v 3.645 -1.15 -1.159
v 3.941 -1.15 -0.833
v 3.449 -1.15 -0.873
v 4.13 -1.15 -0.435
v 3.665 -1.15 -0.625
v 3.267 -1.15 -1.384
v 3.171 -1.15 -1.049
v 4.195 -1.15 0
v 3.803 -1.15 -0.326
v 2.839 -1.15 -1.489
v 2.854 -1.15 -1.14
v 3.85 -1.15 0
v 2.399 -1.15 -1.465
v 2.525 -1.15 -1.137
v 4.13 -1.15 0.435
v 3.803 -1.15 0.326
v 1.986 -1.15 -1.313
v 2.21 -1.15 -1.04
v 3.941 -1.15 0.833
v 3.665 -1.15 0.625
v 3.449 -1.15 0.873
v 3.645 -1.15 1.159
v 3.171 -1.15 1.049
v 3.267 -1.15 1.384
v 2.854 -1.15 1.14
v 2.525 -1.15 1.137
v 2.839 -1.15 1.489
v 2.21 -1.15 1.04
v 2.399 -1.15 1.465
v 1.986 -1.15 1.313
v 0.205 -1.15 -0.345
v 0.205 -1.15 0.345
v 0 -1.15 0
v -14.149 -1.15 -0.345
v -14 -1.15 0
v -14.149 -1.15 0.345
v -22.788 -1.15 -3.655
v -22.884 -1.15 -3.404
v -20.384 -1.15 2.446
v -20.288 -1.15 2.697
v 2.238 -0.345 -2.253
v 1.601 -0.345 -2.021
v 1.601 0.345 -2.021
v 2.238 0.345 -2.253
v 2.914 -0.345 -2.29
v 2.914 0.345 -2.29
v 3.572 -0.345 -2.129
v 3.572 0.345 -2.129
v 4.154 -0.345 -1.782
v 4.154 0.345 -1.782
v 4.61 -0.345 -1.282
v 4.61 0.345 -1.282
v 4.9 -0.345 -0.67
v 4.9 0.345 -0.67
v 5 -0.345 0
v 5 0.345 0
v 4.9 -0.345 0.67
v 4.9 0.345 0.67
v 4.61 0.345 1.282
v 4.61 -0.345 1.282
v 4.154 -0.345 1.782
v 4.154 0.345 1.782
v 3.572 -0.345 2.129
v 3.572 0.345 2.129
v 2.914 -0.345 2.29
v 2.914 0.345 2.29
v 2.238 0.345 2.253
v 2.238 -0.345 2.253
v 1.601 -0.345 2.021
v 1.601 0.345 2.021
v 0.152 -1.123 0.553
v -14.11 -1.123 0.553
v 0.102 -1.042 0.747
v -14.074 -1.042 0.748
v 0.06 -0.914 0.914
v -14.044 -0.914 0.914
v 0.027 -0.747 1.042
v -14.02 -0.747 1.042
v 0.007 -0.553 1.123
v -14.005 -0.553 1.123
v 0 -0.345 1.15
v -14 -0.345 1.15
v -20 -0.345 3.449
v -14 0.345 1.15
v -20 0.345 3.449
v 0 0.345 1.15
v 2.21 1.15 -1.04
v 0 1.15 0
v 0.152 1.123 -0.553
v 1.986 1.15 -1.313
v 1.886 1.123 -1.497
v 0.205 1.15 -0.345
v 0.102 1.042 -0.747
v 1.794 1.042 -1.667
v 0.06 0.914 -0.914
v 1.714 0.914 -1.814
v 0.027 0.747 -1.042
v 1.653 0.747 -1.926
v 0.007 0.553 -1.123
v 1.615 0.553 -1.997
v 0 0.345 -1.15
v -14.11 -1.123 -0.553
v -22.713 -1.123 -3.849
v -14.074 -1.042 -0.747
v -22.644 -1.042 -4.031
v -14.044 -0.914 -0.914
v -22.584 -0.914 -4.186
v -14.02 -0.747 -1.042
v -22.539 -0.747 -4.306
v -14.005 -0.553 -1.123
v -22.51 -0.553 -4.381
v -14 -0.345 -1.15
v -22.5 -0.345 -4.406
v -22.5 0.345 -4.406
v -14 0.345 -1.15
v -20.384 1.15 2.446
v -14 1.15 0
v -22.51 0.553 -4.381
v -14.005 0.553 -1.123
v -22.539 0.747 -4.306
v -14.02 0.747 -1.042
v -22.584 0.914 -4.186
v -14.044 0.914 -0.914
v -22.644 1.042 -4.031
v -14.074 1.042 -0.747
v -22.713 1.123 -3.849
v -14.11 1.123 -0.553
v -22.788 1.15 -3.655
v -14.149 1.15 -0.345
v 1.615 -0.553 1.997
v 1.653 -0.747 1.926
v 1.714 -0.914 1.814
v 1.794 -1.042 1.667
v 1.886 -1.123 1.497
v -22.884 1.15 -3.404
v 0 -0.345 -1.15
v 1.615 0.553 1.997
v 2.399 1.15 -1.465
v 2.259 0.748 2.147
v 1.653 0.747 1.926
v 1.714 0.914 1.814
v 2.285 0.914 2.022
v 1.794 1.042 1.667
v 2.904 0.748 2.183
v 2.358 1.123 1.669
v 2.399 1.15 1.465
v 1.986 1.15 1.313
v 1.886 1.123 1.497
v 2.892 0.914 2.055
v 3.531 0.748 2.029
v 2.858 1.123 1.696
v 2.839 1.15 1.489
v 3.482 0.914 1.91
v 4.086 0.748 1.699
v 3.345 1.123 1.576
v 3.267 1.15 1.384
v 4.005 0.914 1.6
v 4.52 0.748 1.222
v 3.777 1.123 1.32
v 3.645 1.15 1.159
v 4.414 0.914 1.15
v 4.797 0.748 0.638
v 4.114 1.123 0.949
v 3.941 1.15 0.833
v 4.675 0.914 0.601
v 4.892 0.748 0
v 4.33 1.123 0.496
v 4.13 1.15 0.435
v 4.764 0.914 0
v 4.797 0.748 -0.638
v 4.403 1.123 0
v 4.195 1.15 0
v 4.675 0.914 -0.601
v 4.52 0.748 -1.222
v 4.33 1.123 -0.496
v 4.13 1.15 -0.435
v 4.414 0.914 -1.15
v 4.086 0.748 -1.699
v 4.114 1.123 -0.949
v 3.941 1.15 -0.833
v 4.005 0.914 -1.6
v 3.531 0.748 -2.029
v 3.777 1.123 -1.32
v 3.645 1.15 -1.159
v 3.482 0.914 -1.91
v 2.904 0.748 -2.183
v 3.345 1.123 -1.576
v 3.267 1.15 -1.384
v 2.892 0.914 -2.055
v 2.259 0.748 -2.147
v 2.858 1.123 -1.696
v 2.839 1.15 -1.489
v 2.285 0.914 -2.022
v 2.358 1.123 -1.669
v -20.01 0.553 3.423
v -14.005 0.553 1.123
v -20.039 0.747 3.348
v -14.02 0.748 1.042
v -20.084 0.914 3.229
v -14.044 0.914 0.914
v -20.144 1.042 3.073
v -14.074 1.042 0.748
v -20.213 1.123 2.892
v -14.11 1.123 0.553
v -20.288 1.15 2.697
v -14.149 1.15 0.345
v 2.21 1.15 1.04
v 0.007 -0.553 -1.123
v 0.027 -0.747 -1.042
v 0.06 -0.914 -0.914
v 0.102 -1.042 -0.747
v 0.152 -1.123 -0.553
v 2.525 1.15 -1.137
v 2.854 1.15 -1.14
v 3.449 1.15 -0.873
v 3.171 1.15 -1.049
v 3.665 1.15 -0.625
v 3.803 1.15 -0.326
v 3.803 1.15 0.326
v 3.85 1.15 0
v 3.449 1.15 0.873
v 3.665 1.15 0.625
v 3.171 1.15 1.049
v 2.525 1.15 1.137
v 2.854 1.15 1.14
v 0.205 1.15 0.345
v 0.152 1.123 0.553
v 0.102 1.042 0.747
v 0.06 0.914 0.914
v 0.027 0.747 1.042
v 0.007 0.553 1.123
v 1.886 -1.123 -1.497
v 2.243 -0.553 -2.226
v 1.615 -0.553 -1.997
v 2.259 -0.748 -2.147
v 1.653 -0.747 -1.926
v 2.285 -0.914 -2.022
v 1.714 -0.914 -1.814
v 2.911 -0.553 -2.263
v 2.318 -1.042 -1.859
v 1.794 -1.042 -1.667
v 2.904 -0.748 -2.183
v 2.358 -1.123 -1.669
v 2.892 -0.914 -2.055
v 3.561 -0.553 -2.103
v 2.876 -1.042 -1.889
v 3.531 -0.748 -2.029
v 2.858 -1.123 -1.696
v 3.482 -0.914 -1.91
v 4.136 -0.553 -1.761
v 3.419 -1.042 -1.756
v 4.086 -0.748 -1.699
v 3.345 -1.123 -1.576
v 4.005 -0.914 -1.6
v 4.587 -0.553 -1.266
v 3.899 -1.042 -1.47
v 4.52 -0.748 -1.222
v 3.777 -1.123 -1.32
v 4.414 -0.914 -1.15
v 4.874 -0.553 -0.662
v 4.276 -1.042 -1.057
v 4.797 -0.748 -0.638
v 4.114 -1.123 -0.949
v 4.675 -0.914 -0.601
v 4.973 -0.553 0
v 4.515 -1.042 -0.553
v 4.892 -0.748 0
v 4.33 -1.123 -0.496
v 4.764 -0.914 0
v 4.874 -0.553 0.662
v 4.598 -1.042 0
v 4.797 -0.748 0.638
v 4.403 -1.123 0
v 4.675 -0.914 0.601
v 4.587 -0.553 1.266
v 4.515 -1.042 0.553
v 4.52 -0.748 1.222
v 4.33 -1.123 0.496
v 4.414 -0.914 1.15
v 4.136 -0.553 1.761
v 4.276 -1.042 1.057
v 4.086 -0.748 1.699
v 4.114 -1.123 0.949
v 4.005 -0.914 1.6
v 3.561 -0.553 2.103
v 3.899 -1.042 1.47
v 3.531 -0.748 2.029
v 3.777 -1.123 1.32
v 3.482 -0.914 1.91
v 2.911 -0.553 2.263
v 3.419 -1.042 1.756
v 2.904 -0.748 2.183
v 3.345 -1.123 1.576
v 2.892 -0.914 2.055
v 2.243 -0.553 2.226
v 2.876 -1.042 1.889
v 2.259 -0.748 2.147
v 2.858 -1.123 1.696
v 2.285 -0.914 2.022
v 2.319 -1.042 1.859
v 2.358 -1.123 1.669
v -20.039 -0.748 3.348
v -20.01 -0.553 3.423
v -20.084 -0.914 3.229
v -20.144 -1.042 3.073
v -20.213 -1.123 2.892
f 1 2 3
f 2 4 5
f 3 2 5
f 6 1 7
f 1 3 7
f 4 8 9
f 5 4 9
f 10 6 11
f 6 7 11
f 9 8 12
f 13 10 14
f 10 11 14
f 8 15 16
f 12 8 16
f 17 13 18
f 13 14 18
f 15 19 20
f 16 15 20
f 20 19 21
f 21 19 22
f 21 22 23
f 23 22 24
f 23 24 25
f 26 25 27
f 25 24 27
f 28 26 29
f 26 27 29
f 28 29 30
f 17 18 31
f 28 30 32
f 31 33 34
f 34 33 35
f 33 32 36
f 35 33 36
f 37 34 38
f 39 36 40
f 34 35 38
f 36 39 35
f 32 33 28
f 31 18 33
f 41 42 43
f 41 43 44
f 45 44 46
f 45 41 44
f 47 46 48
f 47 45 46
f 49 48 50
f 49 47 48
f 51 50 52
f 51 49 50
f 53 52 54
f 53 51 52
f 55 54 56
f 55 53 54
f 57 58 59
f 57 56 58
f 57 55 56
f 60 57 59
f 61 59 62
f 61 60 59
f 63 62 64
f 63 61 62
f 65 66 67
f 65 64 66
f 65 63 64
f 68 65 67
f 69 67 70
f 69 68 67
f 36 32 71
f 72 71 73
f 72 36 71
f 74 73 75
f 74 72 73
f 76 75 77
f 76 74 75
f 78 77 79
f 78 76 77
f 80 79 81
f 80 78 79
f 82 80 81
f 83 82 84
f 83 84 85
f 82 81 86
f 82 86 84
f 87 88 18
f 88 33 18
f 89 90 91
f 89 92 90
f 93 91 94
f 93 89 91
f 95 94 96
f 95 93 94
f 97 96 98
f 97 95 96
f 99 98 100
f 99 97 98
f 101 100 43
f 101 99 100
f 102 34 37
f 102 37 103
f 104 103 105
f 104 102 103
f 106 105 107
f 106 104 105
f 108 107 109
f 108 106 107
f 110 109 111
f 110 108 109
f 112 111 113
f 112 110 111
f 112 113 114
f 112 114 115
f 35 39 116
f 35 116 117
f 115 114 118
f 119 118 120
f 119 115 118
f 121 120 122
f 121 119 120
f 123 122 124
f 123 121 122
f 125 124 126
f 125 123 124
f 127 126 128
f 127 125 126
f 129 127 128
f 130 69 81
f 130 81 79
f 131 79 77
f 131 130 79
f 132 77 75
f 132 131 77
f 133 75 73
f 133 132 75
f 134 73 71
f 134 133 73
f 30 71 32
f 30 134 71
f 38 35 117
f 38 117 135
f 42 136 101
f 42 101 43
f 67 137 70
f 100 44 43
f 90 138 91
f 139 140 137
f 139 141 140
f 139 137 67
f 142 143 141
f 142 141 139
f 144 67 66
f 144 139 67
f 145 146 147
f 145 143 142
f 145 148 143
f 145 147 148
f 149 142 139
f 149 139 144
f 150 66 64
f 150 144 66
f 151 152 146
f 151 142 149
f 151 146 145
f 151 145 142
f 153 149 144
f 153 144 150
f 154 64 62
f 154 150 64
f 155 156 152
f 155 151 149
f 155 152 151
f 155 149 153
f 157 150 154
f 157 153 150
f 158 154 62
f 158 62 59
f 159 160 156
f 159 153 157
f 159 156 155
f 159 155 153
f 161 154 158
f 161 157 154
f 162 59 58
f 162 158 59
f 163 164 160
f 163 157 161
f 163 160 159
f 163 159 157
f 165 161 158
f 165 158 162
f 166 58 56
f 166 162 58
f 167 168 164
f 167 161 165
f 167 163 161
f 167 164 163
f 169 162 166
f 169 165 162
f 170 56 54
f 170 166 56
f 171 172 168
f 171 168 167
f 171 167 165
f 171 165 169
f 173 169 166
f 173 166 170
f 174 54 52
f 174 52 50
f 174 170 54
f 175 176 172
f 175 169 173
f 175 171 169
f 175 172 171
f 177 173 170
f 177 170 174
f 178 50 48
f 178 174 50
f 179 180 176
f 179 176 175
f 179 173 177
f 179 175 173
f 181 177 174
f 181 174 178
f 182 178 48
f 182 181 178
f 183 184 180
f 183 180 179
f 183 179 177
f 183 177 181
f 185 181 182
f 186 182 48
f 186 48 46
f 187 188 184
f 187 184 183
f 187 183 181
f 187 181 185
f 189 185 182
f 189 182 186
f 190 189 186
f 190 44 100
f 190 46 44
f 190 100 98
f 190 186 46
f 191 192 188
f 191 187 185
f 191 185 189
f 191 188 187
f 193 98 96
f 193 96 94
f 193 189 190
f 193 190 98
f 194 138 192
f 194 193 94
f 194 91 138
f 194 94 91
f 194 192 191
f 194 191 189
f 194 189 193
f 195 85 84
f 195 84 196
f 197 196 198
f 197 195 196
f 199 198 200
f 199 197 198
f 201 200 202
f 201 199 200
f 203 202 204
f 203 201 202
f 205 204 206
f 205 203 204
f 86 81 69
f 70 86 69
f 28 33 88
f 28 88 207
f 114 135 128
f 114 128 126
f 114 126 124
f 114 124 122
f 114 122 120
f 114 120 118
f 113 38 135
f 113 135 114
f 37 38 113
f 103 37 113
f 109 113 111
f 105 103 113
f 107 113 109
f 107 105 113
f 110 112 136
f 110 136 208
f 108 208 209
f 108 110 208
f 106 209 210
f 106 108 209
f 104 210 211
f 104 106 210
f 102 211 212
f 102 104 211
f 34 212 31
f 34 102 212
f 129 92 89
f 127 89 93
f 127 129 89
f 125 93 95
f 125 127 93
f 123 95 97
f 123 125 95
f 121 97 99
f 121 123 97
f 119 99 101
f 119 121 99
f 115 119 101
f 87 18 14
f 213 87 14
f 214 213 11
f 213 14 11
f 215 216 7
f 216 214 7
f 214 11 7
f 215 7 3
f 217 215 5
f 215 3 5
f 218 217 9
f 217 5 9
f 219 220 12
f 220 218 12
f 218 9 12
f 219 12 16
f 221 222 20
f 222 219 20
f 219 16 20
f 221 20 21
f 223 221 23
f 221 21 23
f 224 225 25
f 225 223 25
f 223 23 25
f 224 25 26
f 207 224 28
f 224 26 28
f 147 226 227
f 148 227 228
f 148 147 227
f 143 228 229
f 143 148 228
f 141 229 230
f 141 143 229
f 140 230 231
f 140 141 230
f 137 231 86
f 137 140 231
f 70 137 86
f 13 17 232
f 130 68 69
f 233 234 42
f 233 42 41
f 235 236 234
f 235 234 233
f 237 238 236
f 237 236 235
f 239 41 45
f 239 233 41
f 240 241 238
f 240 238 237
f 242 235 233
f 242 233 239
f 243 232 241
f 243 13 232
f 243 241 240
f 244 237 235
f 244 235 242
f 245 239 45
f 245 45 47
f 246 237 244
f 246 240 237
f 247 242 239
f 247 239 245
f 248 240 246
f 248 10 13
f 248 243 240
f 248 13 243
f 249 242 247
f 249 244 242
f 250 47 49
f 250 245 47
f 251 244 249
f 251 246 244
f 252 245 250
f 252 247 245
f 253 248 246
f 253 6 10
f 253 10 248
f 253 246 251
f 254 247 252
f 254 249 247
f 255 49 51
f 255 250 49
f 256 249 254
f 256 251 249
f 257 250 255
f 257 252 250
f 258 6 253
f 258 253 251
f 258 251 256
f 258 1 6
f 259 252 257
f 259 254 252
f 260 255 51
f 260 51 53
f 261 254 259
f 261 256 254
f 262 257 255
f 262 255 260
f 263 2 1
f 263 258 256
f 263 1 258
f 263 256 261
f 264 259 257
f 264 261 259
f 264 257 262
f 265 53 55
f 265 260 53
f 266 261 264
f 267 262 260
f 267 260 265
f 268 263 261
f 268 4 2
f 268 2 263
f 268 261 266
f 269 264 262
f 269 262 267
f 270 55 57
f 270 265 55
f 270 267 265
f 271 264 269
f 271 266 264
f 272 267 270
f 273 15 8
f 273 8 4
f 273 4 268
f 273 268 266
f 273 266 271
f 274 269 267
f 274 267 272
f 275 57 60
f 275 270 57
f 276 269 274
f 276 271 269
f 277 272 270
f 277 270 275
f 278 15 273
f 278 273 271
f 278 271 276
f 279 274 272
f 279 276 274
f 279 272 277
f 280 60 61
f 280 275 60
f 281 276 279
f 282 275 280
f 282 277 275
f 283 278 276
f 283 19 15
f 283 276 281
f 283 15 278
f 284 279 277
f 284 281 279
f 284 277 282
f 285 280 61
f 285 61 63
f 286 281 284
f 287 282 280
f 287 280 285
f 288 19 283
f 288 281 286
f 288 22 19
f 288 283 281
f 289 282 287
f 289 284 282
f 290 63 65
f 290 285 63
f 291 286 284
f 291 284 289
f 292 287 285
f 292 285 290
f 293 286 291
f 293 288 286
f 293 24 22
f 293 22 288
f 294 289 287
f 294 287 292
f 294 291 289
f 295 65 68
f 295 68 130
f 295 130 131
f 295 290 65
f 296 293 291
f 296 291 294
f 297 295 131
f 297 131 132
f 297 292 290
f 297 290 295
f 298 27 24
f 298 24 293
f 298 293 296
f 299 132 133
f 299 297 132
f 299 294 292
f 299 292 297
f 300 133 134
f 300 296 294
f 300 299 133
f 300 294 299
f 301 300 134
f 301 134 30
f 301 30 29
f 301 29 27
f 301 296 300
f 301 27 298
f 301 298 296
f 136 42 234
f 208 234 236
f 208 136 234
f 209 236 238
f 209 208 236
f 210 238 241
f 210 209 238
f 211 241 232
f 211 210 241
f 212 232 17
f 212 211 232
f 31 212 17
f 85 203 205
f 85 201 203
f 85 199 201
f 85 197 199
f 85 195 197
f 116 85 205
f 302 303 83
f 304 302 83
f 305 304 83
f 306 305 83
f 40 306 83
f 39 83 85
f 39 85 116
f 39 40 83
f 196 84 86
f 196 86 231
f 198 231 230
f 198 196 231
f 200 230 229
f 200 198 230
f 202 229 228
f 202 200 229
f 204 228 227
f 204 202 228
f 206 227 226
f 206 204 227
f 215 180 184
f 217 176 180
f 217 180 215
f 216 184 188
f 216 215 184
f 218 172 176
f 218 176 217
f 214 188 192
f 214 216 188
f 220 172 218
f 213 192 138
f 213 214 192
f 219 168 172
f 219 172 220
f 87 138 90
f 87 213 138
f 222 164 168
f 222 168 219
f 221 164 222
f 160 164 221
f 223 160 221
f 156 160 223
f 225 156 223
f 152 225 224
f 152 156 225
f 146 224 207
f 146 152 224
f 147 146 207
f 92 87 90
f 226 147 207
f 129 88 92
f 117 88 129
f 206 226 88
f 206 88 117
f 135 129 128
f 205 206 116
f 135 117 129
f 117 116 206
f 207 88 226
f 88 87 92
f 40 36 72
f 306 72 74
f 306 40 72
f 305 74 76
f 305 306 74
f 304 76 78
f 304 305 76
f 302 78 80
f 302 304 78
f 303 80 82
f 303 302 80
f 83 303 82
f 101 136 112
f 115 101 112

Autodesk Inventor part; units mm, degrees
ref_plane "YZ Plane" through (0, 0, 0) normal (1, 0, 0) x (0, 1, 0)
sketch "Sketch1" plane through (0, 0, 0) normal (0, 1, 0) x (-1, 0, 0)
  arc A0 (-1.6014, 2.0207) -> (-1.6014, -2.0207) centre (-2.7, 0) ccw
  arc A1 (-2.2102, 1.0405) -> (-2.2102, -1.0405) centre (-2.7, 0) ccw
  line L0 (0, 1.15) -> (14, 1.15)
  line L1 (0, -1.15) -> (14, -1.15)
  line L2 (14, 1.15) -> (20, 3.4487)
  line L3 (20, 3.4487) -> (20.3842, 2.4459)
  line L4 (20.3842, 2.4459) -> (14, 0)
  line L5 (14, 0) -> (22.8842, -3.4037)
  line L6 (22.8842, -3.4037) -> (22.5, -4.4065)
  line L7 (22.5, -4.4065) -> (14, -1.15)
  line L8 (0, 0) -> (-2.2102, -1.0405)
  line L9 (0, 0) -> (-2.2102, 1.0405)
  line L10 (0, 1.15) -> (0, -1.15) construction
  line L11 (0, 1.15) -> (-1.6014, 2.0207)
  line L12 (0, -1.15) -> (-1.6014, -2.0207)
  line L13 (-5, 0) -> (14, 0) construction
  line L14 (14, 1.15) -> (14, -1.15) construction
  dimension "d0" = 14
  dimension "d1" = 20
  dimension "d2" = 159.037
  dimension "d3" = 159.037
  dimension "d4" = 2.5
  dimension "d5" = 1.15
  dimension "d6" = 2.3
  dimension "d7" = 1.15
  dimension "d8" = 1.15
  dimension "d9" = 2.7
extrude "Body" add sketch "Sketch1" along normal mid plane 2.3
fillet "Fillet" radius 0.805 14 edges at (-17, -1.15, 2.2994) (-17, 1.15, 2.2994) (-7, -1.15, 1.15) (-7, 1.15, 1.15) (5, -1.15, 0) (0.8007, -1.15, -1.5853) (0.8007, -1.15, 1.5853) (5, 1.15, 0) (0.8007, 1.15, 1.5853) (0.8007, 1.15, -1.5853) (-7, -1.15, -1.15) (-18.25, -1.15, -2.7783) (-7, 1.15, -1.15) (-18.25, 1.15, -2.7783)
ref_plane "Work Plane1" through (0, -10, 0) normal (0, 0, -1) x (0, 1, 0)
ref_plane "Work Plane3" through (0, 0, 1.15) normal (-1, 0, 0) x (0, 1, 0)
equation "\"d0\" = MSIAB"
equation "\"d1\" = SNLG"
equation "\"d4\" = LGDIF"
equation "\"d5\" = -0.5 * SNND1 + 0.5 * KBR"
equation "\"d6\" = 0.5 * KBR"
equation "\"d7\" = 0.5 * SNND1"
equation "\"d8\" = 0.5 * SNND1"
equation "\"d9\" = KOL - 0.5 * KBR"
equation "\"d10\" = SNND1"
equation "\"d12\" = 0.35 * SNND1"
equation "\"SNND\" = 2.5"
equation "\"SNLG\" = 20"
equation "\"SNND1\" = 2.3"
equation "\"KBR\" = 4.6"
equation "\"KOL\" = 5"
equation "\"LGDIF\" = 2.5"
equation "\"MSIAB\" = 14"
equation "\"NNDMAX\" = 11"
equation "\"DSH\" = 5"
equation "\"NNDMIN\" = 9"
properties part number "100003" material "Steel, Mild"
